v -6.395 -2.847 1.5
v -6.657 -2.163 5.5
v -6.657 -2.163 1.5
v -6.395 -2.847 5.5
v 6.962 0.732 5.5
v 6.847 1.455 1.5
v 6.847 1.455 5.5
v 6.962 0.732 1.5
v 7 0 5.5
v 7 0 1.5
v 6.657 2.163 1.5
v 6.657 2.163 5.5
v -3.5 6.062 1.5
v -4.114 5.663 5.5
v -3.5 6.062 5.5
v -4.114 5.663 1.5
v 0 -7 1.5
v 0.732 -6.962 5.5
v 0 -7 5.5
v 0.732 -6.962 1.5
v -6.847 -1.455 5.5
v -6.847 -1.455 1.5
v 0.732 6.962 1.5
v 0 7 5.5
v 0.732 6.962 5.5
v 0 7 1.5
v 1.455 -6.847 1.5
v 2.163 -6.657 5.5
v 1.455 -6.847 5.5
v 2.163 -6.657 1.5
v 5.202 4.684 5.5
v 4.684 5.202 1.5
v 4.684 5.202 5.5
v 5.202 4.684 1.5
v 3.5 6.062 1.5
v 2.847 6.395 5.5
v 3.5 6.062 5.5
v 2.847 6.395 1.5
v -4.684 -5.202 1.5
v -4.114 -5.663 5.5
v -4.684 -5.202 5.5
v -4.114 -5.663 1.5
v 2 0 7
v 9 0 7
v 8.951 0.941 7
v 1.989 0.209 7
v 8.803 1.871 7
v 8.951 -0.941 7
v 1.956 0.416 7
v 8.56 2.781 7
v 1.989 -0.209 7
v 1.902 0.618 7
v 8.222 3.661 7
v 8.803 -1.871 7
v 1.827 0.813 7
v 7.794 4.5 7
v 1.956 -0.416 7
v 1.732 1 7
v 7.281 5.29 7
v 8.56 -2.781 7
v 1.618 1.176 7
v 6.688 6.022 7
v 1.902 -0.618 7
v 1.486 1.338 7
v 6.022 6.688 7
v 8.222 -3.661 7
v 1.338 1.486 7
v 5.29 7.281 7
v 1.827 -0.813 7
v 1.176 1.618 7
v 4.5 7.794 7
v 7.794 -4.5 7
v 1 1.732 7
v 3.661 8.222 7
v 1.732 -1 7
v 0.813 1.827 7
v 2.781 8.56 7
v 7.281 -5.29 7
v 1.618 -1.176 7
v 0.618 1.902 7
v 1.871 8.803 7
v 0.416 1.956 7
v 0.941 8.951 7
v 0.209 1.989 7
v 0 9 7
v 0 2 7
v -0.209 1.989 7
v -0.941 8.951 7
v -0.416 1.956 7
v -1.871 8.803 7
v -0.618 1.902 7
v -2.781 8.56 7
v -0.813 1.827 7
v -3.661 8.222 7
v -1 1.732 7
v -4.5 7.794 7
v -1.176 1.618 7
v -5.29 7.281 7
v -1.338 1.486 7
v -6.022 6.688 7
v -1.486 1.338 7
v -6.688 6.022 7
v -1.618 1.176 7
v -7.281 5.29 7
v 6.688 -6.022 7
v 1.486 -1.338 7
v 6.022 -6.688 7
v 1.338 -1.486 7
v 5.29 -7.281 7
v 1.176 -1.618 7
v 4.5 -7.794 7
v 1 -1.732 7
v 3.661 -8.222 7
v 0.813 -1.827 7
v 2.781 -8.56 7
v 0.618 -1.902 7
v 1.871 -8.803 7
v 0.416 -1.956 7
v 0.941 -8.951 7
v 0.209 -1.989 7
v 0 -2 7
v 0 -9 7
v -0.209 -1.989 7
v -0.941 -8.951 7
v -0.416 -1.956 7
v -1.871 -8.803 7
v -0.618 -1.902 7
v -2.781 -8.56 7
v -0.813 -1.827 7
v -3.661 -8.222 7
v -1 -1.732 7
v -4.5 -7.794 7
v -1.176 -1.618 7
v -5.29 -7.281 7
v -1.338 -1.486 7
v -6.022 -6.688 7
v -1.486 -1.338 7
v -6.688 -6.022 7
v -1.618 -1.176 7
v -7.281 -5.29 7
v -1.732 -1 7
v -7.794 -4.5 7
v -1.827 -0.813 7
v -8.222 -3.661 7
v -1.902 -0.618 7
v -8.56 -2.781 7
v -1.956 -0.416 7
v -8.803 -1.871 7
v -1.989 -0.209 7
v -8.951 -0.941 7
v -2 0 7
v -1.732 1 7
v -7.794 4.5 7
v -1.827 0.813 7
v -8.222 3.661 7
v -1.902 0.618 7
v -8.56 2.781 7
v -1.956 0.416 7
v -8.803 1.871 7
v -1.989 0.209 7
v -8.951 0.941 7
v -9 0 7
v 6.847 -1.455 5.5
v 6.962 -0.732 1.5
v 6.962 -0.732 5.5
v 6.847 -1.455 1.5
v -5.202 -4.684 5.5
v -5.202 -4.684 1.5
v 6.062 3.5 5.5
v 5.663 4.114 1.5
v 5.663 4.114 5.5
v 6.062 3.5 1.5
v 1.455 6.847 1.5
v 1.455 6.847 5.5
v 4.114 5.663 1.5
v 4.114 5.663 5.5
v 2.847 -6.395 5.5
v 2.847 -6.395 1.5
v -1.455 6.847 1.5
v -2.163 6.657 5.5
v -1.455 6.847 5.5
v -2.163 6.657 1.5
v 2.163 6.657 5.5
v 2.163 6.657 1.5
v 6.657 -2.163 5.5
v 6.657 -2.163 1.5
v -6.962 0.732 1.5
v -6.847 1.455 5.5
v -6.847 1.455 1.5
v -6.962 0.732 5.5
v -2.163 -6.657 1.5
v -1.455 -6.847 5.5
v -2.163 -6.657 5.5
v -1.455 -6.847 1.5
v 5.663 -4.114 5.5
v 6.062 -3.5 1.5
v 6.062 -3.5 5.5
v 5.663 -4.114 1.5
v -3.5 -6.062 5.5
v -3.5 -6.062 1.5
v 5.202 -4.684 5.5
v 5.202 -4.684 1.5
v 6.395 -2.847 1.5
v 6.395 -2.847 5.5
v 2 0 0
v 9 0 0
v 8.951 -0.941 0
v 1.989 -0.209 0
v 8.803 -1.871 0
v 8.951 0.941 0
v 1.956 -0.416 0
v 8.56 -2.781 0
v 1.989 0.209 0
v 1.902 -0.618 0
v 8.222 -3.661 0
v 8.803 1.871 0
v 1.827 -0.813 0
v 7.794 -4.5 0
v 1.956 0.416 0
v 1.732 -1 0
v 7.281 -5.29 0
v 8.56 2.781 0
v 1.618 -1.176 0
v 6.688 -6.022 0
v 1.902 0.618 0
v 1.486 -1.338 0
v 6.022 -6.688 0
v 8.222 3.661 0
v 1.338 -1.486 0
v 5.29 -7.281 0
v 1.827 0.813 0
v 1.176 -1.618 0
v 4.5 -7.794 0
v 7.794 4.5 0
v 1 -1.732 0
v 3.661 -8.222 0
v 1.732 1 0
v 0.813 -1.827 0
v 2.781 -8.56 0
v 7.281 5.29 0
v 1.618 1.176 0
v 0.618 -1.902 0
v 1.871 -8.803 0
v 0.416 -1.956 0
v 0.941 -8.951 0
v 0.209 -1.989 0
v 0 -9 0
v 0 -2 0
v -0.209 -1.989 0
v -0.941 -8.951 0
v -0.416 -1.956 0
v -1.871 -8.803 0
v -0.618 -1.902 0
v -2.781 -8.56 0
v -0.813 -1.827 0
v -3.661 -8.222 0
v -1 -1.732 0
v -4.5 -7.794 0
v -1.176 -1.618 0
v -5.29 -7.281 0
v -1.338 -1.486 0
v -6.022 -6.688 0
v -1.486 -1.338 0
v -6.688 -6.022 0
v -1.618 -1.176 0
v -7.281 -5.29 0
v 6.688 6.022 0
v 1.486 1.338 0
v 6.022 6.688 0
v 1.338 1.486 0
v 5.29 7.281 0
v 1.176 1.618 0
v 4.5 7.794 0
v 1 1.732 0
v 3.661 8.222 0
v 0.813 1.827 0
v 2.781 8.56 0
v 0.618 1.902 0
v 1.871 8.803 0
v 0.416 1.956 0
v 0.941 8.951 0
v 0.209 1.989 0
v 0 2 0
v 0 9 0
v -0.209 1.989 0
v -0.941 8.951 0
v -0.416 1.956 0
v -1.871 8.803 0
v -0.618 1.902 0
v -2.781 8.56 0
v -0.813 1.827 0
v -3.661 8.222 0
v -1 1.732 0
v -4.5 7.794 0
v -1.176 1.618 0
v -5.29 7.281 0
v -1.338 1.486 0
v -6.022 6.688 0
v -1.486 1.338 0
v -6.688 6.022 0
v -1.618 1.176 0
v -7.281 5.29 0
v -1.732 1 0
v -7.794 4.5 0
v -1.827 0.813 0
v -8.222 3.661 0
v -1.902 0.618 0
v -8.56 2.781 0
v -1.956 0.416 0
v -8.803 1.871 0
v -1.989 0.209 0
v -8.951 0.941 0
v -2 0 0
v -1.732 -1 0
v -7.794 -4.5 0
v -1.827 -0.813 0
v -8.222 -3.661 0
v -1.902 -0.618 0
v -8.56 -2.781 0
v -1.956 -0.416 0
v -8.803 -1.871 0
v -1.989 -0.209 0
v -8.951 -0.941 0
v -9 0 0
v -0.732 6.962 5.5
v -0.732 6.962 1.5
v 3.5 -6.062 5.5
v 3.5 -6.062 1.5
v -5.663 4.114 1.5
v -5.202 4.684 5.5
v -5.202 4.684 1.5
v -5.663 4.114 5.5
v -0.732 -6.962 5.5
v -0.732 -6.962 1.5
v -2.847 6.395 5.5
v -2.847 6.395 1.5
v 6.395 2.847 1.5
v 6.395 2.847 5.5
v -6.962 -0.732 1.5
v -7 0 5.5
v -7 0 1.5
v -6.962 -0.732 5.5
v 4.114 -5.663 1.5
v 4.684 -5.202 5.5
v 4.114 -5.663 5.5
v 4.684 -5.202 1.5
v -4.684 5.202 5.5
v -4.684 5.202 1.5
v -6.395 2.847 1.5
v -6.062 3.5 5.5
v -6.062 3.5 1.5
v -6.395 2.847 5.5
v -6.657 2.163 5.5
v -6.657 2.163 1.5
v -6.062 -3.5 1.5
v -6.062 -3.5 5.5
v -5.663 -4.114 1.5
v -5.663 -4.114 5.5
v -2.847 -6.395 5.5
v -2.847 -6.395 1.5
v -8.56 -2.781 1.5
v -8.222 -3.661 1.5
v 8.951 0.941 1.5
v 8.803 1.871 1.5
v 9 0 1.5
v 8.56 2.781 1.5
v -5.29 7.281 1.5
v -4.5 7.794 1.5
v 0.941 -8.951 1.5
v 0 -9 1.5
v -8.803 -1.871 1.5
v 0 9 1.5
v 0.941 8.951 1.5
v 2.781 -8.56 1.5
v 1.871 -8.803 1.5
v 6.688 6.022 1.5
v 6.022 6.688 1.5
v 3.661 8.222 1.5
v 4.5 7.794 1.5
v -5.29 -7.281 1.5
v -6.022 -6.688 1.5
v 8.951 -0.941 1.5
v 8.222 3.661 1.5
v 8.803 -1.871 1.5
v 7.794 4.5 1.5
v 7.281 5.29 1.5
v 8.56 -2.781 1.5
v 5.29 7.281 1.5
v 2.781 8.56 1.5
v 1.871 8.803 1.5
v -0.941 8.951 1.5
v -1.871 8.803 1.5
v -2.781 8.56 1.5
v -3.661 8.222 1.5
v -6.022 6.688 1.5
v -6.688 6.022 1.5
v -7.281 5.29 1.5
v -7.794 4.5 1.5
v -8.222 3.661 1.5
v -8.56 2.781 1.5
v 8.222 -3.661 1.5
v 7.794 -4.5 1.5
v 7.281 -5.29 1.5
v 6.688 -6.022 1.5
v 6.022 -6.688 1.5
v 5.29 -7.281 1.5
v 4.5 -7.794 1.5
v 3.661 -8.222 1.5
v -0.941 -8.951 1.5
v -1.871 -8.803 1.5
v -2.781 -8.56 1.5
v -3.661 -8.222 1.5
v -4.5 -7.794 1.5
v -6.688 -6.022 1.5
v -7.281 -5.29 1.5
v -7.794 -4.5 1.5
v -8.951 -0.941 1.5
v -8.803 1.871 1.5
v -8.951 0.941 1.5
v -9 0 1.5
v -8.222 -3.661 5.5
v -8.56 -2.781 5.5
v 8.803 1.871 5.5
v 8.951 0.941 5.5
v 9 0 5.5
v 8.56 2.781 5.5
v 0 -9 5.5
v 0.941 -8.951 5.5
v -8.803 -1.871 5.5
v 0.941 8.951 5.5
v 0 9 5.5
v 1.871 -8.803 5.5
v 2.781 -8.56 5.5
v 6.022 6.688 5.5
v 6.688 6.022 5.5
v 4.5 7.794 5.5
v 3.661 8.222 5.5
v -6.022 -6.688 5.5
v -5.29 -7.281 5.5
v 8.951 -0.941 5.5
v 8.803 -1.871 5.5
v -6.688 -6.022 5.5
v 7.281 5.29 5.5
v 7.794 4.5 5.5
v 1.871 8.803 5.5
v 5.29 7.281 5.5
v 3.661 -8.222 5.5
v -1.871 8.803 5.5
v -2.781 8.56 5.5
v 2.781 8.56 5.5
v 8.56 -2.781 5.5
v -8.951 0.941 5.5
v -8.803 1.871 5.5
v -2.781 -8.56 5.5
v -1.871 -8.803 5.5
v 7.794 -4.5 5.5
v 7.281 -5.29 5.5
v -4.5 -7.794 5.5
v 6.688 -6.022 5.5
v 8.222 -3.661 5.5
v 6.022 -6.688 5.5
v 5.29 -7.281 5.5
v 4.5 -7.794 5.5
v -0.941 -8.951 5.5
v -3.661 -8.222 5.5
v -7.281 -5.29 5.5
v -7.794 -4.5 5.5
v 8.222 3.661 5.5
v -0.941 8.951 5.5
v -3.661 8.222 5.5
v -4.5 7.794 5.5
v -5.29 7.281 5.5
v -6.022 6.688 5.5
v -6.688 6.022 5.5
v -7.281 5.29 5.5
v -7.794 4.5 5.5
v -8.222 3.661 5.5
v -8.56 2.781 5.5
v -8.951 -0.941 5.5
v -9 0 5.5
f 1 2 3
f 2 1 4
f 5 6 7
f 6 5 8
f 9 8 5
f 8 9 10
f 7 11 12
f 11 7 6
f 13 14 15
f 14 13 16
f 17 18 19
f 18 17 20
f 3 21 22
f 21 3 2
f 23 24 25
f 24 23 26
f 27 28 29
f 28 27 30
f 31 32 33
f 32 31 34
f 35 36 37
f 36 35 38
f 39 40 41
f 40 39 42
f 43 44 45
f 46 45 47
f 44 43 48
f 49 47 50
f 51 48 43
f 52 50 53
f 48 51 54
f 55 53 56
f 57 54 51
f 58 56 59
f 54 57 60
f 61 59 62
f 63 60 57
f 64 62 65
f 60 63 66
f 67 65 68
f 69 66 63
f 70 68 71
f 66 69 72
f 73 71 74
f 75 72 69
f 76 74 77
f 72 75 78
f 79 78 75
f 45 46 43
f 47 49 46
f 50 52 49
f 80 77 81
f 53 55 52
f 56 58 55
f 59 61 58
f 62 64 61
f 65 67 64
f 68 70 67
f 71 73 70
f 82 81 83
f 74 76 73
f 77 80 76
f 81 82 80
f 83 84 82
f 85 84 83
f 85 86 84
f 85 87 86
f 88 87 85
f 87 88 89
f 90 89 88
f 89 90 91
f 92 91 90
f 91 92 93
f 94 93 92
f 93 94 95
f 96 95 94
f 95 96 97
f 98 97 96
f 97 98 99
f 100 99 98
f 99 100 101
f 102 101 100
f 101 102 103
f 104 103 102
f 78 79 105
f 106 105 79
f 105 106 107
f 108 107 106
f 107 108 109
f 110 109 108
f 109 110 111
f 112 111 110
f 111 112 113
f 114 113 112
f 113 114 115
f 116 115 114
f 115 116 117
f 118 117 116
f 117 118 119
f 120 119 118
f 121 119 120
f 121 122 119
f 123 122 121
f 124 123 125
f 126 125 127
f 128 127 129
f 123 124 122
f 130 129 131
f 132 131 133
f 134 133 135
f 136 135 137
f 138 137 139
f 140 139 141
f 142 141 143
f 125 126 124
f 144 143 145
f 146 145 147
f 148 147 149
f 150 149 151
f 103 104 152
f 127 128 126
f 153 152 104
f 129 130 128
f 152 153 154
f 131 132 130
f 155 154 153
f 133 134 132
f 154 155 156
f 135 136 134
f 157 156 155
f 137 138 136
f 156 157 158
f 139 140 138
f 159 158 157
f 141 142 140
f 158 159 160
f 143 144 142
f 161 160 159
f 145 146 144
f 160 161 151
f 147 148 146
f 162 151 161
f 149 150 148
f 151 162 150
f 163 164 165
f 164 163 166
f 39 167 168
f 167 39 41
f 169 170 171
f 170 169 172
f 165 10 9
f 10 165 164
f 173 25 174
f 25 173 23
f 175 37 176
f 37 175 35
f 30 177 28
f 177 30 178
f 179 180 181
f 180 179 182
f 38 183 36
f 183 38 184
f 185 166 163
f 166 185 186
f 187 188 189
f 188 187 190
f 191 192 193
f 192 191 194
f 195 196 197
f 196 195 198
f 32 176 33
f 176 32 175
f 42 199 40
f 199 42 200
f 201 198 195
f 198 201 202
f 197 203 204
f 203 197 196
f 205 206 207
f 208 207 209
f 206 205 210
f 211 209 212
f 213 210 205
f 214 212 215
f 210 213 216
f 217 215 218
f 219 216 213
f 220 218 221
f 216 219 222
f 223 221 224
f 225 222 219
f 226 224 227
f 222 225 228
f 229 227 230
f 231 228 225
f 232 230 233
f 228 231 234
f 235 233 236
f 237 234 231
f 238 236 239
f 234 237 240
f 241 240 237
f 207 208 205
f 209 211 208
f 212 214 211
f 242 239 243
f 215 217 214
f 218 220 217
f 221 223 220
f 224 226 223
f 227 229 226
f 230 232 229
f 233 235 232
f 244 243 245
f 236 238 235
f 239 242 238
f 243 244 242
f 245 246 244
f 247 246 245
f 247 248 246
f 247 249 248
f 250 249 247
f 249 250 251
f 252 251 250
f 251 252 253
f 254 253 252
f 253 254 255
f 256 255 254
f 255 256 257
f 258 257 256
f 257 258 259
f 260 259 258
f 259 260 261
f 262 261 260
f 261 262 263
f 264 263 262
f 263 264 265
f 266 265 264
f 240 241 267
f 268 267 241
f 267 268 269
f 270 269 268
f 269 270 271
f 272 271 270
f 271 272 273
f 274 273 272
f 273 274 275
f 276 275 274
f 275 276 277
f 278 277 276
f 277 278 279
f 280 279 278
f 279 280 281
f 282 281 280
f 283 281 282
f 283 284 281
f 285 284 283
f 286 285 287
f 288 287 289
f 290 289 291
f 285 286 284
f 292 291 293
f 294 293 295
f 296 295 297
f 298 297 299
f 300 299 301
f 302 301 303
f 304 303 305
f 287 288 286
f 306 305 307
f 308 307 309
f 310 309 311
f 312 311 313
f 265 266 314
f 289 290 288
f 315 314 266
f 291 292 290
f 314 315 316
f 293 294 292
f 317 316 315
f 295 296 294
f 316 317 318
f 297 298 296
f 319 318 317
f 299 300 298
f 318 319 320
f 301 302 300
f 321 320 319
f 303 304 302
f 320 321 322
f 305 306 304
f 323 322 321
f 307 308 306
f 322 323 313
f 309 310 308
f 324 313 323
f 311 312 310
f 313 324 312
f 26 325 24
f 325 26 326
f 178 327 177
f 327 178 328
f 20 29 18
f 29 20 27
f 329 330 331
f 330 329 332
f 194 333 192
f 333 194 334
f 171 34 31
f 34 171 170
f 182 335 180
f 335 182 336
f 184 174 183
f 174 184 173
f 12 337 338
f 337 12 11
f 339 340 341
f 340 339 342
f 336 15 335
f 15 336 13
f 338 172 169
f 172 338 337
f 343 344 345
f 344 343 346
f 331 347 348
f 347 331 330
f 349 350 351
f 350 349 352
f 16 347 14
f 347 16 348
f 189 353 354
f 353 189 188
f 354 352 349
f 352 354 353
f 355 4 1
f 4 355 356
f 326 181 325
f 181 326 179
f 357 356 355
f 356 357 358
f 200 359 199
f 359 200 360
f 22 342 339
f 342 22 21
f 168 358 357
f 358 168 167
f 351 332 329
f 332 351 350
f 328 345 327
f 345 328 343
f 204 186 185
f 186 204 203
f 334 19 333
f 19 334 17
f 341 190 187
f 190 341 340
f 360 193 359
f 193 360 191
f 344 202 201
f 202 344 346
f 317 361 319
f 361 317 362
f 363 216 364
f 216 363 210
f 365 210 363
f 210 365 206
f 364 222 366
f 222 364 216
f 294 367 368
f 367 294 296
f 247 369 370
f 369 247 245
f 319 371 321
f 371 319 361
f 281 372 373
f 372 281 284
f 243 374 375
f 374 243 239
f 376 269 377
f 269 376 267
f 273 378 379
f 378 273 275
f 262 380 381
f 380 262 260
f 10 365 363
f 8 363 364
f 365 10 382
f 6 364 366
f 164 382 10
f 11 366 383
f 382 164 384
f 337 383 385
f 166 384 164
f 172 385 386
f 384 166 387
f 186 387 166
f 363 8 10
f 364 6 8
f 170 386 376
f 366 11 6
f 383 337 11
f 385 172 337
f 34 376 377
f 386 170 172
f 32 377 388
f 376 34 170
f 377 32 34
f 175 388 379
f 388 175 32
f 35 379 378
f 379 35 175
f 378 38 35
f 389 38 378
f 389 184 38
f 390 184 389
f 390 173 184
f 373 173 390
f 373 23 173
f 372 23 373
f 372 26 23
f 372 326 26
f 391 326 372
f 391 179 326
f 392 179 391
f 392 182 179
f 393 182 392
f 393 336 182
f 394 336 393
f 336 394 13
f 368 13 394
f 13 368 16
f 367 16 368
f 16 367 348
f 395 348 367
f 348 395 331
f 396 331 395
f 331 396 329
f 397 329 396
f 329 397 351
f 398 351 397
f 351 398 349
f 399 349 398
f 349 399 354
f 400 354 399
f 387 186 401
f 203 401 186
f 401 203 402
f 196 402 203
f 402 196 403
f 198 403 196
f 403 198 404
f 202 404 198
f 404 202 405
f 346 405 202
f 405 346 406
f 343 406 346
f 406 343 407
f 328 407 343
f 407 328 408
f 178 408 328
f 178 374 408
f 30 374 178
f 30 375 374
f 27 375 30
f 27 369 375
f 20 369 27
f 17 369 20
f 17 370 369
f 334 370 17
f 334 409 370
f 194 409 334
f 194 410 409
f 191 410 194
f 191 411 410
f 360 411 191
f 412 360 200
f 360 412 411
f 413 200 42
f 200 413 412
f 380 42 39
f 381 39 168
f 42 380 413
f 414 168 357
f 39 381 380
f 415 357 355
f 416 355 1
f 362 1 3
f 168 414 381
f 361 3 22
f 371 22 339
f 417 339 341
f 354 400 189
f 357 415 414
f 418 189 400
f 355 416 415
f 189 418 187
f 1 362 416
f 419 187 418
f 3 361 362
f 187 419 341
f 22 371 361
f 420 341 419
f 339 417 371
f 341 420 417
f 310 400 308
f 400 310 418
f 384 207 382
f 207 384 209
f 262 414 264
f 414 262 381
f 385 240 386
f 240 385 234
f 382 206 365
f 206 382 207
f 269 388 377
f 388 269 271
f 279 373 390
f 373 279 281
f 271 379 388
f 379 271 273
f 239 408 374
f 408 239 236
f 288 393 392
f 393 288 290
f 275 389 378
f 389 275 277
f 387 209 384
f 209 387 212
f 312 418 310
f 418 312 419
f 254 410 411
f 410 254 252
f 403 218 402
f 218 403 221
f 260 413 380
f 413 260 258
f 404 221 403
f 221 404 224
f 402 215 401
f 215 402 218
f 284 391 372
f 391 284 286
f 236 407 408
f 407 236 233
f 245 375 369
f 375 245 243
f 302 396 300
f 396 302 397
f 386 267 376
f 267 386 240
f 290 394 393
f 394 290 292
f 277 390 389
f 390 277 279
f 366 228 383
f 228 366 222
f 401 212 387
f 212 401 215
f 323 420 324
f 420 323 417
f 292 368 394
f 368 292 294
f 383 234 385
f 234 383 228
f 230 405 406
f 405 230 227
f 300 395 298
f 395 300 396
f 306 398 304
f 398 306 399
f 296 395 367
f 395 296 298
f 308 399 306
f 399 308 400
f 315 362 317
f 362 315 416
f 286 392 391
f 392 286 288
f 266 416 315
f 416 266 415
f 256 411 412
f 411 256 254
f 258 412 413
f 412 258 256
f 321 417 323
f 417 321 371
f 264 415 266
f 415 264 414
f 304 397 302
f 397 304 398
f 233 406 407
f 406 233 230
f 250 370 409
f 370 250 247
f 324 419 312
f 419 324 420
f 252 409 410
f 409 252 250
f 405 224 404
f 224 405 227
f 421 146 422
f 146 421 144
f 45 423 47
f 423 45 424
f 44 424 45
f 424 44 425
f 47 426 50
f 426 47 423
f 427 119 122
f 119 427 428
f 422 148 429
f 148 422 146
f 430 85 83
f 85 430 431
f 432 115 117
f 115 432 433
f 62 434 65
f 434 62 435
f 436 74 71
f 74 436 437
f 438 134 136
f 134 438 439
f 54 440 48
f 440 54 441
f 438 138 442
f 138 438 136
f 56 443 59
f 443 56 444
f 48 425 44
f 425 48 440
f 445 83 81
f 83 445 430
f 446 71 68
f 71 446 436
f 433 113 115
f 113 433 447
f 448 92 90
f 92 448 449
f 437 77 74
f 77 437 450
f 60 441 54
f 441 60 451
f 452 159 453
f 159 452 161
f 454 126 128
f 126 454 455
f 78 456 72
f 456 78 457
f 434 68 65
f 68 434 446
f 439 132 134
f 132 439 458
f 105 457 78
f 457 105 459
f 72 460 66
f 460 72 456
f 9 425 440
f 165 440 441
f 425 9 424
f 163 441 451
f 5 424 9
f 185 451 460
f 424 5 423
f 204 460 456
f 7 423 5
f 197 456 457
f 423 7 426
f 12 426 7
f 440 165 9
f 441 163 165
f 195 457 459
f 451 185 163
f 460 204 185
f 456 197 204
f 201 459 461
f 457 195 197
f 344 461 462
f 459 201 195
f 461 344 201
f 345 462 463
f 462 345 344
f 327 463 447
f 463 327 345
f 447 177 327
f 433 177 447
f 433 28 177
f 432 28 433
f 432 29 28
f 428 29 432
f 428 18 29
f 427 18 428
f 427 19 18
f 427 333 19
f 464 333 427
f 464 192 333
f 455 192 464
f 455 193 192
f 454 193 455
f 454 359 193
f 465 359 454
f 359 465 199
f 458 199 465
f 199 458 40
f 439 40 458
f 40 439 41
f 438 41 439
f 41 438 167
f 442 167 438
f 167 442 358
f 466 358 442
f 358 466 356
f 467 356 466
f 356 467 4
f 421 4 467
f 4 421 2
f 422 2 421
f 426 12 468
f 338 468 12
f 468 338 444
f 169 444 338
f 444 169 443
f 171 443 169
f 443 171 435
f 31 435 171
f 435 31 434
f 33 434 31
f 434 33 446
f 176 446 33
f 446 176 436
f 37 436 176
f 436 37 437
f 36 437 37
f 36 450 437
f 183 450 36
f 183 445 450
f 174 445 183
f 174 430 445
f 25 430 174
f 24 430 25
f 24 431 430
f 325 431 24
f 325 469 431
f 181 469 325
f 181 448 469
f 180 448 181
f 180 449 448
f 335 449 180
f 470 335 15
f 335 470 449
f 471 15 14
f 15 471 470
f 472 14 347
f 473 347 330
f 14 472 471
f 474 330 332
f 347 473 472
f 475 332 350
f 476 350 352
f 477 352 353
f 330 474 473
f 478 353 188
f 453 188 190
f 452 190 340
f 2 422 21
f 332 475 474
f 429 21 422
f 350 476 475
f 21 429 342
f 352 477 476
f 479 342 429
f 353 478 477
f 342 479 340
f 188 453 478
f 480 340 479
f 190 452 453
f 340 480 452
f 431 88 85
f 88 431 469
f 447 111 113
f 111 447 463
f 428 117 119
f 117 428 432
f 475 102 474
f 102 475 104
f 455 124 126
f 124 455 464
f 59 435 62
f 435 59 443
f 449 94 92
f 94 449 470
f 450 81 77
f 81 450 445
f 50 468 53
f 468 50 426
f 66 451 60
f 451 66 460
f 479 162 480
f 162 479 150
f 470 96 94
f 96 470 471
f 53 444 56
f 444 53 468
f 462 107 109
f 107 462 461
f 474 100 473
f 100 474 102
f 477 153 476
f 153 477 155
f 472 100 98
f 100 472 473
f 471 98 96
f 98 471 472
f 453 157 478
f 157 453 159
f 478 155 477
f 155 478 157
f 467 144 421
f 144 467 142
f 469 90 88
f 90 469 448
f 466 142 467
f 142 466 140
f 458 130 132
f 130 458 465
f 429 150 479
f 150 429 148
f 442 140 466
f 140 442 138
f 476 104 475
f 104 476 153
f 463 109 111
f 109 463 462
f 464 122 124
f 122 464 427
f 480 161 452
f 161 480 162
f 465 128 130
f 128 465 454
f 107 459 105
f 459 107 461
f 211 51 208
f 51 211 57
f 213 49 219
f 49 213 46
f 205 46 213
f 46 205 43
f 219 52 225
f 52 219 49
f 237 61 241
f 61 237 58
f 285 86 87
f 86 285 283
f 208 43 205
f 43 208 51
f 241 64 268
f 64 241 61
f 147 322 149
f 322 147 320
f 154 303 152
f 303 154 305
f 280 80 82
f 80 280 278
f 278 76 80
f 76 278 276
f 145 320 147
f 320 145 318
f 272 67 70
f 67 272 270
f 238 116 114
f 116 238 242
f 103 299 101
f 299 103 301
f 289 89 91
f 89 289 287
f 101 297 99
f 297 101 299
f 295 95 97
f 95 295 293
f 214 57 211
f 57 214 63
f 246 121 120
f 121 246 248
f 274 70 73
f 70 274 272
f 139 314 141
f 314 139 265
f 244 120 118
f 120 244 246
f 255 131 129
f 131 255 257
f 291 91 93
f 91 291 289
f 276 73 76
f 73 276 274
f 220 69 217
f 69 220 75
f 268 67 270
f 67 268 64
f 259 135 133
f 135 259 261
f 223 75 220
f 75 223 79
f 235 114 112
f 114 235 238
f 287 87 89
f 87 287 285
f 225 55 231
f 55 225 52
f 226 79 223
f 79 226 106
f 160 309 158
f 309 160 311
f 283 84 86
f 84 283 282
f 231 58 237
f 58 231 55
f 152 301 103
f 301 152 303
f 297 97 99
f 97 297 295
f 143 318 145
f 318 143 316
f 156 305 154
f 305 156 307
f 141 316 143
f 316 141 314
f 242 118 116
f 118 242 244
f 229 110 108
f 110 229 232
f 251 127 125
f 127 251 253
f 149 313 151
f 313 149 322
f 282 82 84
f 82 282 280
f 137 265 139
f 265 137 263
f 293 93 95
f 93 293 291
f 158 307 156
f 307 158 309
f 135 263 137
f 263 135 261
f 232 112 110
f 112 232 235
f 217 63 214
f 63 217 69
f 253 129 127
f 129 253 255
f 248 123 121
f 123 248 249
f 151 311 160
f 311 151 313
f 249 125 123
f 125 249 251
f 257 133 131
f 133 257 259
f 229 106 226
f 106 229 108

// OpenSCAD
// Plain idler pulley with retaining flanges.
$fn = 60;
eps = 0.02;
bore_d = 4;
body_d = 14;
width = 7;
flange_t = 1.5;
difference() {
    union() {
        cylinder(d=body_d,h=width);
        cylinder(d=body_d+4,h=flange_t);
        translate([0,0,width-flange_t]) cylinder(d=body_d+4,h=flange_t);
    }
    translate([0,0,-eps]) cylinder(d=bore_d,h=width+2*eps);
}
